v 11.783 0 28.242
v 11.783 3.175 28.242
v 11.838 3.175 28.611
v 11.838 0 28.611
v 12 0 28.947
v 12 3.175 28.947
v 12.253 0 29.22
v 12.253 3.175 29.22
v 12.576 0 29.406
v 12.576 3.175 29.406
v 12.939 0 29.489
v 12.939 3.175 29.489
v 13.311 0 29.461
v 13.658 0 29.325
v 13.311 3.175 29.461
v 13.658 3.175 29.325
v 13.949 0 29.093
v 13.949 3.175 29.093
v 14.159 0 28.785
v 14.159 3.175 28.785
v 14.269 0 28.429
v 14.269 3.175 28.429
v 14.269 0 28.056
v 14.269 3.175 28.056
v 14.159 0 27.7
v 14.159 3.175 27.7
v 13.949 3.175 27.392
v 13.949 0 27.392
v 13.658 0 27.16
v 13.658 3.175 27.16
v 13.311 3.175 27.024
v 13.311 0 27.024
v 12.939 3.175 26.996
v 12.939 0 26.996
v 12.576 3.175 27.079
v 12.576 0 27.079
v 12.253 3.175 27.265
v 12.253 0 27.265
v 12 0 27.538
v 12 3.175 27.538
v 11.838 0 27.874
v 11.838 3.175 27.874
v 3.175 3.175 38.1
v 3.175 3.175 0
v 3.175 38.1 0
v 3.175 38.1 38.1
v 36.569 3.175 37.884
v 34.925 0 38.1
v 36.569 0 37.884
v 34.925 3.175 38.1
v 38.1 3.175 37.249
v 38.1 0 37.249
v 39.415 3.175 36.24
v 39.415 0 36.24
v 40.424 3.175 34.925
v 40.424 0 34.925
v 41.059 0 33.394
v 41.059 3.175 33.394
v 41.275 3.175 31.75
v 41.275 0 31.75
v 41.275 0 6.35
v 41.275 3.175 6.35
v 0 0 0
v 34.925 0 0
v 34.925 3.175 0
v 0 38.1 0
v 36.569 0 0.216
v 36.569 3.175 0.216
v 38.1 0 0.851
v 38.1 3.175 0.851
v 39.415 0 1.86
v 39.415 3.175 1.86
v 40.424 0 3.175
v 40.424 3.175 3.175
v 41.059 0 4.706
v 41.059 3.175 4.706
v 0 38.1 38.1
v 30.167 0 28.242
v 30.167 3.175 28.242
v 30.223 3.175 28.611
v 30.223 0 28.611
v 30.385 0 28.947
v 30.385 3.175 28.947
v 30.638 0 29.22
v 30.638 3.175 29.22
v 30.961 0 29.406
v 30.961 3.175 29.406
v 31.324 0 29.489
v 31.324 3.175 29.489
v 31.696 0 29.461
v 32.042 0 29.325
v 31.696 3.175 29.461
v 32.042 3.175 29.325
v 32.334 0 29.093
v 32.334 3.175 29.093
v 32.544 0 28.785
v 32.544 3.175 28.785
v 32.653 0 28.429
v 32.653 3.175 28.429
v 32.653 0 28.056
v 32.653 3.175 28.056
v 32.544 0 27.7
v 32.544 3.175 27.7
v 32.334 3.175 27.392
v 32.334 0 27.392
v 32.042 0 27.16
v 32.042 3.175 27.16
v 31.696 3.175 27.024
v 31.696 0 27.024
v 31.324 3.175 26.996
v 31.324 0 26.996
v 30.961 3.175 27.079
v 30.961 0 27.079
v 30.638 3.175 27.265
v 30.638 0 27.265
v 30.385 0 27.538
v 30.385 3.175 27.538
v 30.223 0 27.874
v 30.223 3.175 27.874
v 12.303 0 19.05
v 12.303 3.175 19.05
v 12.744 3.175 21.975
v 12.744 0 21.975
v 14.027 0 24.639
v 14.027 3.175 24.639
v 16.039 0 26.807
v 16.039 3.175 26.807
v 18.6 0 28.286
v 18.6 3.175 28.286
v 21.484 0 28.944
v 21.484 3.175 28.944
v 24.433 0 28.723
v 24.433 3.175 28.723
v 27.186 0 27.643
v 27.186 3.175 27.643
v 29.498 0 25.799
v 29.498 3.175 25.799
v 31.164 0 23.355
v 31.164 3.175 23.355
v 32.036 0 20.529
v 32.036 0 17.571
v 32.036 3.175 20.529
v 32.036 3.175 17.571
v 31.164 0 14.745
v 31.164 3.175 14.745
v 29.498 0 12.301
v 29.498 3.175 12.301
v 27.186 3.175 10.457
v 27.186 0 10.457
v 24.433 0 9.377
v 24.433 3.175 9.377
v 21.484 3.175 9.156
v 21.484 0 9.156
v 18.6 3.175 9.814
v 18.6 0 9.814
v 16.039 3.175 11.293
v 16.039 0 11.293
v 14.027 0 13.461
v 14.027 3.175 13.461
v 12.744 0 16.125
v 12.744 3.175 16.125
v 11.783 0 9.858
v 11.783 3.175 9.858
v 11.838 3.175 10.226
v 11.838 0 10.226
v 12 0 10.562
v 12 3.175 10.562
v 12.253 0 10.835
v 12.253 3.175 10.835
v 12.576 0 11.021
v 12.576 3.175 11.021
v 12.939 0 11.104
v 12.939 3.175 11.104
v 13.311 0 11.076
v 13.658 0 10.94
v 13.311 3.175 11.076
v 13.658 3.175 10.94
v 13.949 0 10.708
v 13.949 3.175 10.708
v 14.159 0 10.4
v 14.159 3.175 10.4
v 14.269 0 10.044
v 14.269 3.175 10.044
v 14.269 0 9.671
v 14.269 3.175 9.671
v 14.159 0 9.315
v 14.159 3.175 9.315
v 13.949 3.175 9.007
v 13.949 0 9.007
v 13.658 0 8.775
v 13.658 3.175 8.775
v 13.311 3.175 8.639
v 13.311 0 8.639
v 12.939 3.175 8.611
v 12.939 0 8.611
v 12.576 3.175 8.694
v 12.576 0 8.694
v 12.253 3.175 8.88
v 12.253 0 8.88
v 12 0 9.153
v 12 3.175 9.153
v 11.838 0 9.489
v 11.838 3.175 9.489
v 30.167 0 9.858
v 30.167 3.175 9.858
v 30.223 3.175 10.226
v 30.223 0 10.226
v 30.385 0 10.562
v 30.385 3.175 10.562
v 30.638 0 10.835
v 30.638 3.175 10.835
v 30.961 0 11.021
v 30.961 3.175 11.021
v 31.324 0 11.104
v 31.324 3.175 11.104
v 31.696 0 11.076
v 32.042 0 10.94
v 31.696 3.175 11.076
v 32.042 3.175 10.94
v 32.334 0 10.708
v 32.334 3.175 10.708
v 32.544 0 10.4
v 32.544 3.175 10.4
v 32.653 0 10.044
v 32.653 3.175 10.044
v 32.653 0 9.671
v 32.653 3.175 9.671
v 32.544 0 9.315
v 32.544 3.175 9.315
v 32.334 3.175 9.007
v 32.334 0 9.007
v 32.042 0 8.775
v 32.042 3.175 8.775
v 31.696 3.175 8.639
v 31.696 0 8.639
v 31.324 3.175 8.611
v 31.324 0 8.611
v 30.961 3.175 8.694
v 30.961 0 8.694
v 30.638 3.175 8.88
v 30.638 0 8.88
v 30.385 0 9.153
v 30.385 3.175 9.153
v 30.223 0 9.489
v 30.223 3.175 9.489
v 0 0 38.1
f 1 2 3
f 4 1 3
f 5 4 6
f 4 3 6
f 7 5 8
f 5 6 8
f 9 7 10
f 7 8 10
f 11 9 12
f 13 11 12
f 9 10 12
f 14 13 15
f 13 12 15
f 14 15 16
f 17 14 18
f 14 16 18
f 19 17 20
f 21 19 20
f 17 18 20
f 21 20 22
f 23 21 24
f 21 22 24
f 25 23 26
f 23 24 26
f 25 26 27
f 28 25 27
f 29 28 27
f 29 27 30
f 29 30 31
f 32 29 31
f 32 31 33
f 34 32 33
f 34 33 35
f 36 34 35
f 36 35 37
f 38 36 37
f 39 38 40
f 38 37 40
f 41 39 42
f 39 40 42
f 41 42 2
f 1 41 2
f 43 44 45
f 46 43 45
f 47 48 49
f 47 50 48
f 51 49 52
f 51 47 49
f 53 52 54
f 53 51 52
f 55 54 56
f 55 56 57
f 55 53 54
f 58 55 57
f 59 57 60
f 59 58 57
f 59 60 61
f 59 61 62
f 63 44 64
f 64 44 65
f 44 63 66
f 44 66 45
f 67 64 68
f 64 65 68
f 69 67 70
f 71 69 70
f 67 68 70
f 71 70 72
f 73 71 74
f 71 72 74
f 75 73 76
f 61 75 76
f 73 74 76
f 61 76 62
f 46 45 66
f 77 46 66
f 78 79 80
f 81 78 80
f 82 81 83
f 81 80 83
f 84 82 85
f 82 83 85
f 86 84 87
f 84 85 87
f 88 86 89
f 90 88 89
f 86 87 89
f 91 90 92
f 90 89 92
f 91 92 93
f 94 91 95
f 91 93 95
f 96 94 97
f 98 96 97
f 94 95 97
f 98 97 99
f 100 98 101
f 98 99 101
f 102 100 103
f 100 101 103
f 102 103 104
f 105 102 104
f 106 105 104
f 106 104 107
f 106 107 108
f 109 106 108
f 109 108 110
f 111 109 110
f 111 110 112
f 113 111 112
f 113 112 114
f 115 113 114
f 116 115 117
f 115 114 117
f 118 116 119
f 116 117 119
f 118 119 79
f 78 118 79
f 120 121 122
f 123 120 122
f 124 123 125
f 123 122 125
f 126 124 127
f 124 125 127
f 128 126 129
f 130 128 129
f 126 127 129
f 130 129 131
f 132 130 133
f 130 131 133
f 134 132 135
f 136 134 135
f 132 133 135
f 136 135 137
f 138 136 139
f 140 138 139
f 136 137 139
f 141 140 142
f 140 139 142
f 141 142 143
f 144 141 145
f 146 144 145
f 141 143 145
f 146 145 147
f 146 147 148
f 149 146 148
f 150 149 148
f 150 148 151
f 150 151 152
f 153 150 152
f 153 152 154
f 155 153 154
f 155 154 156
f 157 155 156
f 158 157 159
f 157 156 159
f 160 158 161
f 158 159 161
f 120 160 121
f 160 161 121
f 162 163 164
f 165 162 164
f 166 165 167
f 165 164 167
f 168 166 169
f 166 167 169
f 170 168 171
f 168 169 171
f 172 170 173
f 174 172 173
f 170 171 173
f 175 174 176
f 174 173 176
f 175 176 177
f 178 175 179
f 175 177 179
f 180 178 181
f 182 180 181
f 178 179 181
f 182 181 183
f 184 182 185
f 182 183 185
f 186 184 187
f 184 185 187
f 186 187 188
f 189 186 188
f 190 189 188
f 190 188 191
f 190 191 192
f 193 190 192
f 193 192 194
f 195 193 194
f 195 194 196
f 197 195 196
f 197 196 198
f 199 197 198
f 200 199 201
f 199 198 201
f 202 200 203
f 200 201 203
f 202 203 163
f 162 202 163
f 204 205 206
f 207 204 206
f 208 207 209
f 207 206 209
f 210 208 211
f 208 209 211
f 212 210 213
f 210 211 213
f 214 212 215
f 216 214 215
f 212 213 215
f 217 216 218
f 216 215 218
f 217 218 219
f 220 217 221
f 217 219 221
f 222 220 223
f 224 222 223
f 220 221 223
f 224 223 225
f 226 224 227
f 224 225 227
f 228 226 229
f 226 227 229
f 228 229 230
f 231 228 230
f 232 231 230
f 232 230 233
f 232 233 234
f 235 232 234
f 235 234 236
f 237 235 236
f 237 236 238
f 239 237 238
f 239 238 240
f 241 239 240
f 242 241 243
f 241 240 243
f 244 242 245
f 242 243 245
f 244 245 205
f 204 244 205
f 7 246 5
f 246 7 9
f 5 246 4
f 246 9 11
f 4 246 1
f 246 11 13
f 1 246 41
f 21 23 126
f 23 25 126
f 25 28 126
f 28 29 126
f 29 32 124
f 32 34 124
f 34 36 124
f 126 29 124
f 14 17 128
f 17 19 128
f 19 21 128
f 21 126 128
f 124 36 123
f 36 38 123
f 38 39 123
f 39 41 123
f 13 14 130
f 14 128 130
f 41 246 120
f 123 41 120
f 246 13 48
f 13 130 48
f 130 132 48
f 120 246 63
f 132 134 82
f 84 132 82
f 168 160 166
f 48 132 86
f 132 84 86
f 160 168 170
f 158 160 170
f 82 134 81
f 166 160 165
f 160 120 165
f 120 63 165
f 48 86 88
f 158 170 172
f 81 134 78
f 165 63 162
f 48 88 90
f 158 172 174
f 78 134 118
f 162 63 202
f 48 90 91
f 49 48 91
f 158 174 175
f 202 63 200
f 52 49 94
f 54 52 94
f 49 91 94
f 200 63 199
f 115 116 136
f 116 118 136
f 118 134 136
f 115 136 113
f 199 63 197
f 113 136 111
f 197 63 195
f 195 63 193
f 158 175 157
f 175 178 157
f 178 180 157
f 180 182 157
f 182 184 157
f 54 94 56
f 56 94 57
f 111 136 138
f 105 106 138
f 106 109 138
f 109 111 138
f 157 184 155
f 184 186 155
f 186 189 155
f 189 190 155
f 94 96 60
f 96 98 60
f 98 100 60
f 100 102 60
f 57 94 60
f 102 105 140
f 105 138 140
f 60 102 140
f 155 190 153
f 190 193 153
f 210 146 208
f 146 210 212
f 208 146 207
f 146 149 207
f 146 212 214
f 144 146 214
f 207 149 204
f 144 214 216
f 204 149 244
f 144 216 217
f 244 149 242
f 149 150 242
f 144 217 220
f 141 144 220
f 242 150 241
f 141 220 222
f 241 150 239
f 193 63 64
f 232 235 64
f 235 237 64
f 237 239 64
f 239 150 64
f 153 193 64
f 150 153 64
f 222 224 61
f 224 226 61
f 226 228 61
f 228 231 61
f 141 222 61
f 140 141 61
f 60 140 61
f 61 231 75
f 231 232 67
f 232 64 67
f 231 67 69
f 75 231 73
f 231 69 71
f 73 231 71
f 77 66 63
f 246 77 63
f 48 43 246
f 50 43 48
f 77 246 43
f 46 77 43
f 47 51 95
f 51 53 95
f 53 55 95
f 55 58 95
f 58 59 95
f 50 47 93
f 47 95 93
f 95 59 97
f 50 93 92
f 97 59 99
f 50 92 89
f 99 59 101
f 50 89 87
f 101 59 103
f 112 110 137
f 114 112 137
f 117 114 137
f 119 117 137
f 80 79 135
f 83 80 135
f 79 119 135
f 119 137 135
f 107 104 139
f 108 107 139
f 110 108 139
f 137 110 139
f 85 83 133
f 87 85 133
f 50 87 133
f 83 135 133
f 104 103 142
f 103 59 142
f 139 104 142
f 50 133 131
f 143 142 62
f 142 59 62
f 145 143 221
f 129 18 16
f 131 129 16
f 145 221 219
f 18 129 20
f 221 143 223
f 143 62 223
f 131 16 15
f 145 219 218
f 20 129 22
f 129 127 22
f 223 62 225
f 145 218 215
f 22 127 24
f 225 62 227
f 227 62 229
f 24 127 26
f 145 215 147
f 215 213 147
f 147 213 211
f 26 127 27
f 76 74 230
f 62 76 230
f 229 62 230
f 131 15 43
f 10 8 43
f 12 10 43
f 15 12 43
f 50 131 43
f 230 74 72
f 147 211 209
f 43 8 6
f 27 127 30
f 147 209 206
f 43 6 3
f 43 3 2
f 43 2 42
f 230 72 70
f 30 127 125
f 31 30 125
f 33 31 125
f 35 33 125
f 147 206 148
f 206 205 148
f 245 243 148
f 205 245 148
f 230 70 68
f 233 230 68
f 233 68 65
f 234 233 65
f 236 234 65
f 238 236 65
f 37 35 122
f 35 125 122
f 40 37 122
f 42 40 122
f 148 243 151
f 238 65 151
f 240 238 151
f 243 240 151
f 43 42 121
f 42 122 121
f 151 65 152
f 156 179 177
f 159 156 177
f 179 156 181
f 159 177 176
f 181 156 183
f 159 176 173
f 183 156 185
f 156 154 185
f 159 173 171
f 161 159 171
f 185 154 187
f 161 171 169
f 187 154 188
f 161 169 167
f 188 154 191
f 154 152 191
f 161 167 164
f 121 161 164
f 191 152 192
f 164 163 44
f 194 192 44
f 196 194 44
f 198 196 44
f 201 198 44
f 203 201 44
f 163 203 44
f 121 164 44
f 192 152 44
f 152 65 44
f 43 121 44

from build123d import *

# Parameters (mm, degrees)
F1_DEPTH = 38.1
F2_R     = 9.921835
F2_R_2   = 1.25
F3_DEPTH = 3.175
F4_R     = 6.35


with BuildPart() as f1:
    # F0 (on Top) → F1 (new body)
    with BuildSketch(Plane.XY):
        Polygon((0, 38.1), (0, 0), (41.275, 0), (41.275, 3.175), (3.175, 3.175), (3.175, 38.1), align=None)
    extrude(amount=F1_DEPTH)

    # F2 (on face) → F3 (cut, through all)
    with BuildSketch(Plane(origin=(0, 3.175, 0), x_dir=(-1, 0, 0), z_dir=(0, 1, 0))):
        with Locations((-22.225, 19.05)):
            Circle(F2_R)
        with Locations((-13.032612, 9.857612)):
            Circle(F2_R_2)
        with Locations((-31.417388, 28.242388)):
            Circle(F2_R_2)
        with Locations((-31.417388, 9.857612)):
            Circle(F2_R_2)
        with Locations((-13.032612, 28.242388)):
            Circle(F2_R_2)
    extrude(amount=-F3_DEPTH, mode=Mode.SUBTRACT)

    # F4
    f4_edges = [f1.edges().sort_by_distance(p)[0] for p in [
        (41.275, 1.5875, 38.1),
        (41.275, 1.5875, 0),
    ]]
    fillet(f4_edges, radius=F4_R)


solid = f1.part
